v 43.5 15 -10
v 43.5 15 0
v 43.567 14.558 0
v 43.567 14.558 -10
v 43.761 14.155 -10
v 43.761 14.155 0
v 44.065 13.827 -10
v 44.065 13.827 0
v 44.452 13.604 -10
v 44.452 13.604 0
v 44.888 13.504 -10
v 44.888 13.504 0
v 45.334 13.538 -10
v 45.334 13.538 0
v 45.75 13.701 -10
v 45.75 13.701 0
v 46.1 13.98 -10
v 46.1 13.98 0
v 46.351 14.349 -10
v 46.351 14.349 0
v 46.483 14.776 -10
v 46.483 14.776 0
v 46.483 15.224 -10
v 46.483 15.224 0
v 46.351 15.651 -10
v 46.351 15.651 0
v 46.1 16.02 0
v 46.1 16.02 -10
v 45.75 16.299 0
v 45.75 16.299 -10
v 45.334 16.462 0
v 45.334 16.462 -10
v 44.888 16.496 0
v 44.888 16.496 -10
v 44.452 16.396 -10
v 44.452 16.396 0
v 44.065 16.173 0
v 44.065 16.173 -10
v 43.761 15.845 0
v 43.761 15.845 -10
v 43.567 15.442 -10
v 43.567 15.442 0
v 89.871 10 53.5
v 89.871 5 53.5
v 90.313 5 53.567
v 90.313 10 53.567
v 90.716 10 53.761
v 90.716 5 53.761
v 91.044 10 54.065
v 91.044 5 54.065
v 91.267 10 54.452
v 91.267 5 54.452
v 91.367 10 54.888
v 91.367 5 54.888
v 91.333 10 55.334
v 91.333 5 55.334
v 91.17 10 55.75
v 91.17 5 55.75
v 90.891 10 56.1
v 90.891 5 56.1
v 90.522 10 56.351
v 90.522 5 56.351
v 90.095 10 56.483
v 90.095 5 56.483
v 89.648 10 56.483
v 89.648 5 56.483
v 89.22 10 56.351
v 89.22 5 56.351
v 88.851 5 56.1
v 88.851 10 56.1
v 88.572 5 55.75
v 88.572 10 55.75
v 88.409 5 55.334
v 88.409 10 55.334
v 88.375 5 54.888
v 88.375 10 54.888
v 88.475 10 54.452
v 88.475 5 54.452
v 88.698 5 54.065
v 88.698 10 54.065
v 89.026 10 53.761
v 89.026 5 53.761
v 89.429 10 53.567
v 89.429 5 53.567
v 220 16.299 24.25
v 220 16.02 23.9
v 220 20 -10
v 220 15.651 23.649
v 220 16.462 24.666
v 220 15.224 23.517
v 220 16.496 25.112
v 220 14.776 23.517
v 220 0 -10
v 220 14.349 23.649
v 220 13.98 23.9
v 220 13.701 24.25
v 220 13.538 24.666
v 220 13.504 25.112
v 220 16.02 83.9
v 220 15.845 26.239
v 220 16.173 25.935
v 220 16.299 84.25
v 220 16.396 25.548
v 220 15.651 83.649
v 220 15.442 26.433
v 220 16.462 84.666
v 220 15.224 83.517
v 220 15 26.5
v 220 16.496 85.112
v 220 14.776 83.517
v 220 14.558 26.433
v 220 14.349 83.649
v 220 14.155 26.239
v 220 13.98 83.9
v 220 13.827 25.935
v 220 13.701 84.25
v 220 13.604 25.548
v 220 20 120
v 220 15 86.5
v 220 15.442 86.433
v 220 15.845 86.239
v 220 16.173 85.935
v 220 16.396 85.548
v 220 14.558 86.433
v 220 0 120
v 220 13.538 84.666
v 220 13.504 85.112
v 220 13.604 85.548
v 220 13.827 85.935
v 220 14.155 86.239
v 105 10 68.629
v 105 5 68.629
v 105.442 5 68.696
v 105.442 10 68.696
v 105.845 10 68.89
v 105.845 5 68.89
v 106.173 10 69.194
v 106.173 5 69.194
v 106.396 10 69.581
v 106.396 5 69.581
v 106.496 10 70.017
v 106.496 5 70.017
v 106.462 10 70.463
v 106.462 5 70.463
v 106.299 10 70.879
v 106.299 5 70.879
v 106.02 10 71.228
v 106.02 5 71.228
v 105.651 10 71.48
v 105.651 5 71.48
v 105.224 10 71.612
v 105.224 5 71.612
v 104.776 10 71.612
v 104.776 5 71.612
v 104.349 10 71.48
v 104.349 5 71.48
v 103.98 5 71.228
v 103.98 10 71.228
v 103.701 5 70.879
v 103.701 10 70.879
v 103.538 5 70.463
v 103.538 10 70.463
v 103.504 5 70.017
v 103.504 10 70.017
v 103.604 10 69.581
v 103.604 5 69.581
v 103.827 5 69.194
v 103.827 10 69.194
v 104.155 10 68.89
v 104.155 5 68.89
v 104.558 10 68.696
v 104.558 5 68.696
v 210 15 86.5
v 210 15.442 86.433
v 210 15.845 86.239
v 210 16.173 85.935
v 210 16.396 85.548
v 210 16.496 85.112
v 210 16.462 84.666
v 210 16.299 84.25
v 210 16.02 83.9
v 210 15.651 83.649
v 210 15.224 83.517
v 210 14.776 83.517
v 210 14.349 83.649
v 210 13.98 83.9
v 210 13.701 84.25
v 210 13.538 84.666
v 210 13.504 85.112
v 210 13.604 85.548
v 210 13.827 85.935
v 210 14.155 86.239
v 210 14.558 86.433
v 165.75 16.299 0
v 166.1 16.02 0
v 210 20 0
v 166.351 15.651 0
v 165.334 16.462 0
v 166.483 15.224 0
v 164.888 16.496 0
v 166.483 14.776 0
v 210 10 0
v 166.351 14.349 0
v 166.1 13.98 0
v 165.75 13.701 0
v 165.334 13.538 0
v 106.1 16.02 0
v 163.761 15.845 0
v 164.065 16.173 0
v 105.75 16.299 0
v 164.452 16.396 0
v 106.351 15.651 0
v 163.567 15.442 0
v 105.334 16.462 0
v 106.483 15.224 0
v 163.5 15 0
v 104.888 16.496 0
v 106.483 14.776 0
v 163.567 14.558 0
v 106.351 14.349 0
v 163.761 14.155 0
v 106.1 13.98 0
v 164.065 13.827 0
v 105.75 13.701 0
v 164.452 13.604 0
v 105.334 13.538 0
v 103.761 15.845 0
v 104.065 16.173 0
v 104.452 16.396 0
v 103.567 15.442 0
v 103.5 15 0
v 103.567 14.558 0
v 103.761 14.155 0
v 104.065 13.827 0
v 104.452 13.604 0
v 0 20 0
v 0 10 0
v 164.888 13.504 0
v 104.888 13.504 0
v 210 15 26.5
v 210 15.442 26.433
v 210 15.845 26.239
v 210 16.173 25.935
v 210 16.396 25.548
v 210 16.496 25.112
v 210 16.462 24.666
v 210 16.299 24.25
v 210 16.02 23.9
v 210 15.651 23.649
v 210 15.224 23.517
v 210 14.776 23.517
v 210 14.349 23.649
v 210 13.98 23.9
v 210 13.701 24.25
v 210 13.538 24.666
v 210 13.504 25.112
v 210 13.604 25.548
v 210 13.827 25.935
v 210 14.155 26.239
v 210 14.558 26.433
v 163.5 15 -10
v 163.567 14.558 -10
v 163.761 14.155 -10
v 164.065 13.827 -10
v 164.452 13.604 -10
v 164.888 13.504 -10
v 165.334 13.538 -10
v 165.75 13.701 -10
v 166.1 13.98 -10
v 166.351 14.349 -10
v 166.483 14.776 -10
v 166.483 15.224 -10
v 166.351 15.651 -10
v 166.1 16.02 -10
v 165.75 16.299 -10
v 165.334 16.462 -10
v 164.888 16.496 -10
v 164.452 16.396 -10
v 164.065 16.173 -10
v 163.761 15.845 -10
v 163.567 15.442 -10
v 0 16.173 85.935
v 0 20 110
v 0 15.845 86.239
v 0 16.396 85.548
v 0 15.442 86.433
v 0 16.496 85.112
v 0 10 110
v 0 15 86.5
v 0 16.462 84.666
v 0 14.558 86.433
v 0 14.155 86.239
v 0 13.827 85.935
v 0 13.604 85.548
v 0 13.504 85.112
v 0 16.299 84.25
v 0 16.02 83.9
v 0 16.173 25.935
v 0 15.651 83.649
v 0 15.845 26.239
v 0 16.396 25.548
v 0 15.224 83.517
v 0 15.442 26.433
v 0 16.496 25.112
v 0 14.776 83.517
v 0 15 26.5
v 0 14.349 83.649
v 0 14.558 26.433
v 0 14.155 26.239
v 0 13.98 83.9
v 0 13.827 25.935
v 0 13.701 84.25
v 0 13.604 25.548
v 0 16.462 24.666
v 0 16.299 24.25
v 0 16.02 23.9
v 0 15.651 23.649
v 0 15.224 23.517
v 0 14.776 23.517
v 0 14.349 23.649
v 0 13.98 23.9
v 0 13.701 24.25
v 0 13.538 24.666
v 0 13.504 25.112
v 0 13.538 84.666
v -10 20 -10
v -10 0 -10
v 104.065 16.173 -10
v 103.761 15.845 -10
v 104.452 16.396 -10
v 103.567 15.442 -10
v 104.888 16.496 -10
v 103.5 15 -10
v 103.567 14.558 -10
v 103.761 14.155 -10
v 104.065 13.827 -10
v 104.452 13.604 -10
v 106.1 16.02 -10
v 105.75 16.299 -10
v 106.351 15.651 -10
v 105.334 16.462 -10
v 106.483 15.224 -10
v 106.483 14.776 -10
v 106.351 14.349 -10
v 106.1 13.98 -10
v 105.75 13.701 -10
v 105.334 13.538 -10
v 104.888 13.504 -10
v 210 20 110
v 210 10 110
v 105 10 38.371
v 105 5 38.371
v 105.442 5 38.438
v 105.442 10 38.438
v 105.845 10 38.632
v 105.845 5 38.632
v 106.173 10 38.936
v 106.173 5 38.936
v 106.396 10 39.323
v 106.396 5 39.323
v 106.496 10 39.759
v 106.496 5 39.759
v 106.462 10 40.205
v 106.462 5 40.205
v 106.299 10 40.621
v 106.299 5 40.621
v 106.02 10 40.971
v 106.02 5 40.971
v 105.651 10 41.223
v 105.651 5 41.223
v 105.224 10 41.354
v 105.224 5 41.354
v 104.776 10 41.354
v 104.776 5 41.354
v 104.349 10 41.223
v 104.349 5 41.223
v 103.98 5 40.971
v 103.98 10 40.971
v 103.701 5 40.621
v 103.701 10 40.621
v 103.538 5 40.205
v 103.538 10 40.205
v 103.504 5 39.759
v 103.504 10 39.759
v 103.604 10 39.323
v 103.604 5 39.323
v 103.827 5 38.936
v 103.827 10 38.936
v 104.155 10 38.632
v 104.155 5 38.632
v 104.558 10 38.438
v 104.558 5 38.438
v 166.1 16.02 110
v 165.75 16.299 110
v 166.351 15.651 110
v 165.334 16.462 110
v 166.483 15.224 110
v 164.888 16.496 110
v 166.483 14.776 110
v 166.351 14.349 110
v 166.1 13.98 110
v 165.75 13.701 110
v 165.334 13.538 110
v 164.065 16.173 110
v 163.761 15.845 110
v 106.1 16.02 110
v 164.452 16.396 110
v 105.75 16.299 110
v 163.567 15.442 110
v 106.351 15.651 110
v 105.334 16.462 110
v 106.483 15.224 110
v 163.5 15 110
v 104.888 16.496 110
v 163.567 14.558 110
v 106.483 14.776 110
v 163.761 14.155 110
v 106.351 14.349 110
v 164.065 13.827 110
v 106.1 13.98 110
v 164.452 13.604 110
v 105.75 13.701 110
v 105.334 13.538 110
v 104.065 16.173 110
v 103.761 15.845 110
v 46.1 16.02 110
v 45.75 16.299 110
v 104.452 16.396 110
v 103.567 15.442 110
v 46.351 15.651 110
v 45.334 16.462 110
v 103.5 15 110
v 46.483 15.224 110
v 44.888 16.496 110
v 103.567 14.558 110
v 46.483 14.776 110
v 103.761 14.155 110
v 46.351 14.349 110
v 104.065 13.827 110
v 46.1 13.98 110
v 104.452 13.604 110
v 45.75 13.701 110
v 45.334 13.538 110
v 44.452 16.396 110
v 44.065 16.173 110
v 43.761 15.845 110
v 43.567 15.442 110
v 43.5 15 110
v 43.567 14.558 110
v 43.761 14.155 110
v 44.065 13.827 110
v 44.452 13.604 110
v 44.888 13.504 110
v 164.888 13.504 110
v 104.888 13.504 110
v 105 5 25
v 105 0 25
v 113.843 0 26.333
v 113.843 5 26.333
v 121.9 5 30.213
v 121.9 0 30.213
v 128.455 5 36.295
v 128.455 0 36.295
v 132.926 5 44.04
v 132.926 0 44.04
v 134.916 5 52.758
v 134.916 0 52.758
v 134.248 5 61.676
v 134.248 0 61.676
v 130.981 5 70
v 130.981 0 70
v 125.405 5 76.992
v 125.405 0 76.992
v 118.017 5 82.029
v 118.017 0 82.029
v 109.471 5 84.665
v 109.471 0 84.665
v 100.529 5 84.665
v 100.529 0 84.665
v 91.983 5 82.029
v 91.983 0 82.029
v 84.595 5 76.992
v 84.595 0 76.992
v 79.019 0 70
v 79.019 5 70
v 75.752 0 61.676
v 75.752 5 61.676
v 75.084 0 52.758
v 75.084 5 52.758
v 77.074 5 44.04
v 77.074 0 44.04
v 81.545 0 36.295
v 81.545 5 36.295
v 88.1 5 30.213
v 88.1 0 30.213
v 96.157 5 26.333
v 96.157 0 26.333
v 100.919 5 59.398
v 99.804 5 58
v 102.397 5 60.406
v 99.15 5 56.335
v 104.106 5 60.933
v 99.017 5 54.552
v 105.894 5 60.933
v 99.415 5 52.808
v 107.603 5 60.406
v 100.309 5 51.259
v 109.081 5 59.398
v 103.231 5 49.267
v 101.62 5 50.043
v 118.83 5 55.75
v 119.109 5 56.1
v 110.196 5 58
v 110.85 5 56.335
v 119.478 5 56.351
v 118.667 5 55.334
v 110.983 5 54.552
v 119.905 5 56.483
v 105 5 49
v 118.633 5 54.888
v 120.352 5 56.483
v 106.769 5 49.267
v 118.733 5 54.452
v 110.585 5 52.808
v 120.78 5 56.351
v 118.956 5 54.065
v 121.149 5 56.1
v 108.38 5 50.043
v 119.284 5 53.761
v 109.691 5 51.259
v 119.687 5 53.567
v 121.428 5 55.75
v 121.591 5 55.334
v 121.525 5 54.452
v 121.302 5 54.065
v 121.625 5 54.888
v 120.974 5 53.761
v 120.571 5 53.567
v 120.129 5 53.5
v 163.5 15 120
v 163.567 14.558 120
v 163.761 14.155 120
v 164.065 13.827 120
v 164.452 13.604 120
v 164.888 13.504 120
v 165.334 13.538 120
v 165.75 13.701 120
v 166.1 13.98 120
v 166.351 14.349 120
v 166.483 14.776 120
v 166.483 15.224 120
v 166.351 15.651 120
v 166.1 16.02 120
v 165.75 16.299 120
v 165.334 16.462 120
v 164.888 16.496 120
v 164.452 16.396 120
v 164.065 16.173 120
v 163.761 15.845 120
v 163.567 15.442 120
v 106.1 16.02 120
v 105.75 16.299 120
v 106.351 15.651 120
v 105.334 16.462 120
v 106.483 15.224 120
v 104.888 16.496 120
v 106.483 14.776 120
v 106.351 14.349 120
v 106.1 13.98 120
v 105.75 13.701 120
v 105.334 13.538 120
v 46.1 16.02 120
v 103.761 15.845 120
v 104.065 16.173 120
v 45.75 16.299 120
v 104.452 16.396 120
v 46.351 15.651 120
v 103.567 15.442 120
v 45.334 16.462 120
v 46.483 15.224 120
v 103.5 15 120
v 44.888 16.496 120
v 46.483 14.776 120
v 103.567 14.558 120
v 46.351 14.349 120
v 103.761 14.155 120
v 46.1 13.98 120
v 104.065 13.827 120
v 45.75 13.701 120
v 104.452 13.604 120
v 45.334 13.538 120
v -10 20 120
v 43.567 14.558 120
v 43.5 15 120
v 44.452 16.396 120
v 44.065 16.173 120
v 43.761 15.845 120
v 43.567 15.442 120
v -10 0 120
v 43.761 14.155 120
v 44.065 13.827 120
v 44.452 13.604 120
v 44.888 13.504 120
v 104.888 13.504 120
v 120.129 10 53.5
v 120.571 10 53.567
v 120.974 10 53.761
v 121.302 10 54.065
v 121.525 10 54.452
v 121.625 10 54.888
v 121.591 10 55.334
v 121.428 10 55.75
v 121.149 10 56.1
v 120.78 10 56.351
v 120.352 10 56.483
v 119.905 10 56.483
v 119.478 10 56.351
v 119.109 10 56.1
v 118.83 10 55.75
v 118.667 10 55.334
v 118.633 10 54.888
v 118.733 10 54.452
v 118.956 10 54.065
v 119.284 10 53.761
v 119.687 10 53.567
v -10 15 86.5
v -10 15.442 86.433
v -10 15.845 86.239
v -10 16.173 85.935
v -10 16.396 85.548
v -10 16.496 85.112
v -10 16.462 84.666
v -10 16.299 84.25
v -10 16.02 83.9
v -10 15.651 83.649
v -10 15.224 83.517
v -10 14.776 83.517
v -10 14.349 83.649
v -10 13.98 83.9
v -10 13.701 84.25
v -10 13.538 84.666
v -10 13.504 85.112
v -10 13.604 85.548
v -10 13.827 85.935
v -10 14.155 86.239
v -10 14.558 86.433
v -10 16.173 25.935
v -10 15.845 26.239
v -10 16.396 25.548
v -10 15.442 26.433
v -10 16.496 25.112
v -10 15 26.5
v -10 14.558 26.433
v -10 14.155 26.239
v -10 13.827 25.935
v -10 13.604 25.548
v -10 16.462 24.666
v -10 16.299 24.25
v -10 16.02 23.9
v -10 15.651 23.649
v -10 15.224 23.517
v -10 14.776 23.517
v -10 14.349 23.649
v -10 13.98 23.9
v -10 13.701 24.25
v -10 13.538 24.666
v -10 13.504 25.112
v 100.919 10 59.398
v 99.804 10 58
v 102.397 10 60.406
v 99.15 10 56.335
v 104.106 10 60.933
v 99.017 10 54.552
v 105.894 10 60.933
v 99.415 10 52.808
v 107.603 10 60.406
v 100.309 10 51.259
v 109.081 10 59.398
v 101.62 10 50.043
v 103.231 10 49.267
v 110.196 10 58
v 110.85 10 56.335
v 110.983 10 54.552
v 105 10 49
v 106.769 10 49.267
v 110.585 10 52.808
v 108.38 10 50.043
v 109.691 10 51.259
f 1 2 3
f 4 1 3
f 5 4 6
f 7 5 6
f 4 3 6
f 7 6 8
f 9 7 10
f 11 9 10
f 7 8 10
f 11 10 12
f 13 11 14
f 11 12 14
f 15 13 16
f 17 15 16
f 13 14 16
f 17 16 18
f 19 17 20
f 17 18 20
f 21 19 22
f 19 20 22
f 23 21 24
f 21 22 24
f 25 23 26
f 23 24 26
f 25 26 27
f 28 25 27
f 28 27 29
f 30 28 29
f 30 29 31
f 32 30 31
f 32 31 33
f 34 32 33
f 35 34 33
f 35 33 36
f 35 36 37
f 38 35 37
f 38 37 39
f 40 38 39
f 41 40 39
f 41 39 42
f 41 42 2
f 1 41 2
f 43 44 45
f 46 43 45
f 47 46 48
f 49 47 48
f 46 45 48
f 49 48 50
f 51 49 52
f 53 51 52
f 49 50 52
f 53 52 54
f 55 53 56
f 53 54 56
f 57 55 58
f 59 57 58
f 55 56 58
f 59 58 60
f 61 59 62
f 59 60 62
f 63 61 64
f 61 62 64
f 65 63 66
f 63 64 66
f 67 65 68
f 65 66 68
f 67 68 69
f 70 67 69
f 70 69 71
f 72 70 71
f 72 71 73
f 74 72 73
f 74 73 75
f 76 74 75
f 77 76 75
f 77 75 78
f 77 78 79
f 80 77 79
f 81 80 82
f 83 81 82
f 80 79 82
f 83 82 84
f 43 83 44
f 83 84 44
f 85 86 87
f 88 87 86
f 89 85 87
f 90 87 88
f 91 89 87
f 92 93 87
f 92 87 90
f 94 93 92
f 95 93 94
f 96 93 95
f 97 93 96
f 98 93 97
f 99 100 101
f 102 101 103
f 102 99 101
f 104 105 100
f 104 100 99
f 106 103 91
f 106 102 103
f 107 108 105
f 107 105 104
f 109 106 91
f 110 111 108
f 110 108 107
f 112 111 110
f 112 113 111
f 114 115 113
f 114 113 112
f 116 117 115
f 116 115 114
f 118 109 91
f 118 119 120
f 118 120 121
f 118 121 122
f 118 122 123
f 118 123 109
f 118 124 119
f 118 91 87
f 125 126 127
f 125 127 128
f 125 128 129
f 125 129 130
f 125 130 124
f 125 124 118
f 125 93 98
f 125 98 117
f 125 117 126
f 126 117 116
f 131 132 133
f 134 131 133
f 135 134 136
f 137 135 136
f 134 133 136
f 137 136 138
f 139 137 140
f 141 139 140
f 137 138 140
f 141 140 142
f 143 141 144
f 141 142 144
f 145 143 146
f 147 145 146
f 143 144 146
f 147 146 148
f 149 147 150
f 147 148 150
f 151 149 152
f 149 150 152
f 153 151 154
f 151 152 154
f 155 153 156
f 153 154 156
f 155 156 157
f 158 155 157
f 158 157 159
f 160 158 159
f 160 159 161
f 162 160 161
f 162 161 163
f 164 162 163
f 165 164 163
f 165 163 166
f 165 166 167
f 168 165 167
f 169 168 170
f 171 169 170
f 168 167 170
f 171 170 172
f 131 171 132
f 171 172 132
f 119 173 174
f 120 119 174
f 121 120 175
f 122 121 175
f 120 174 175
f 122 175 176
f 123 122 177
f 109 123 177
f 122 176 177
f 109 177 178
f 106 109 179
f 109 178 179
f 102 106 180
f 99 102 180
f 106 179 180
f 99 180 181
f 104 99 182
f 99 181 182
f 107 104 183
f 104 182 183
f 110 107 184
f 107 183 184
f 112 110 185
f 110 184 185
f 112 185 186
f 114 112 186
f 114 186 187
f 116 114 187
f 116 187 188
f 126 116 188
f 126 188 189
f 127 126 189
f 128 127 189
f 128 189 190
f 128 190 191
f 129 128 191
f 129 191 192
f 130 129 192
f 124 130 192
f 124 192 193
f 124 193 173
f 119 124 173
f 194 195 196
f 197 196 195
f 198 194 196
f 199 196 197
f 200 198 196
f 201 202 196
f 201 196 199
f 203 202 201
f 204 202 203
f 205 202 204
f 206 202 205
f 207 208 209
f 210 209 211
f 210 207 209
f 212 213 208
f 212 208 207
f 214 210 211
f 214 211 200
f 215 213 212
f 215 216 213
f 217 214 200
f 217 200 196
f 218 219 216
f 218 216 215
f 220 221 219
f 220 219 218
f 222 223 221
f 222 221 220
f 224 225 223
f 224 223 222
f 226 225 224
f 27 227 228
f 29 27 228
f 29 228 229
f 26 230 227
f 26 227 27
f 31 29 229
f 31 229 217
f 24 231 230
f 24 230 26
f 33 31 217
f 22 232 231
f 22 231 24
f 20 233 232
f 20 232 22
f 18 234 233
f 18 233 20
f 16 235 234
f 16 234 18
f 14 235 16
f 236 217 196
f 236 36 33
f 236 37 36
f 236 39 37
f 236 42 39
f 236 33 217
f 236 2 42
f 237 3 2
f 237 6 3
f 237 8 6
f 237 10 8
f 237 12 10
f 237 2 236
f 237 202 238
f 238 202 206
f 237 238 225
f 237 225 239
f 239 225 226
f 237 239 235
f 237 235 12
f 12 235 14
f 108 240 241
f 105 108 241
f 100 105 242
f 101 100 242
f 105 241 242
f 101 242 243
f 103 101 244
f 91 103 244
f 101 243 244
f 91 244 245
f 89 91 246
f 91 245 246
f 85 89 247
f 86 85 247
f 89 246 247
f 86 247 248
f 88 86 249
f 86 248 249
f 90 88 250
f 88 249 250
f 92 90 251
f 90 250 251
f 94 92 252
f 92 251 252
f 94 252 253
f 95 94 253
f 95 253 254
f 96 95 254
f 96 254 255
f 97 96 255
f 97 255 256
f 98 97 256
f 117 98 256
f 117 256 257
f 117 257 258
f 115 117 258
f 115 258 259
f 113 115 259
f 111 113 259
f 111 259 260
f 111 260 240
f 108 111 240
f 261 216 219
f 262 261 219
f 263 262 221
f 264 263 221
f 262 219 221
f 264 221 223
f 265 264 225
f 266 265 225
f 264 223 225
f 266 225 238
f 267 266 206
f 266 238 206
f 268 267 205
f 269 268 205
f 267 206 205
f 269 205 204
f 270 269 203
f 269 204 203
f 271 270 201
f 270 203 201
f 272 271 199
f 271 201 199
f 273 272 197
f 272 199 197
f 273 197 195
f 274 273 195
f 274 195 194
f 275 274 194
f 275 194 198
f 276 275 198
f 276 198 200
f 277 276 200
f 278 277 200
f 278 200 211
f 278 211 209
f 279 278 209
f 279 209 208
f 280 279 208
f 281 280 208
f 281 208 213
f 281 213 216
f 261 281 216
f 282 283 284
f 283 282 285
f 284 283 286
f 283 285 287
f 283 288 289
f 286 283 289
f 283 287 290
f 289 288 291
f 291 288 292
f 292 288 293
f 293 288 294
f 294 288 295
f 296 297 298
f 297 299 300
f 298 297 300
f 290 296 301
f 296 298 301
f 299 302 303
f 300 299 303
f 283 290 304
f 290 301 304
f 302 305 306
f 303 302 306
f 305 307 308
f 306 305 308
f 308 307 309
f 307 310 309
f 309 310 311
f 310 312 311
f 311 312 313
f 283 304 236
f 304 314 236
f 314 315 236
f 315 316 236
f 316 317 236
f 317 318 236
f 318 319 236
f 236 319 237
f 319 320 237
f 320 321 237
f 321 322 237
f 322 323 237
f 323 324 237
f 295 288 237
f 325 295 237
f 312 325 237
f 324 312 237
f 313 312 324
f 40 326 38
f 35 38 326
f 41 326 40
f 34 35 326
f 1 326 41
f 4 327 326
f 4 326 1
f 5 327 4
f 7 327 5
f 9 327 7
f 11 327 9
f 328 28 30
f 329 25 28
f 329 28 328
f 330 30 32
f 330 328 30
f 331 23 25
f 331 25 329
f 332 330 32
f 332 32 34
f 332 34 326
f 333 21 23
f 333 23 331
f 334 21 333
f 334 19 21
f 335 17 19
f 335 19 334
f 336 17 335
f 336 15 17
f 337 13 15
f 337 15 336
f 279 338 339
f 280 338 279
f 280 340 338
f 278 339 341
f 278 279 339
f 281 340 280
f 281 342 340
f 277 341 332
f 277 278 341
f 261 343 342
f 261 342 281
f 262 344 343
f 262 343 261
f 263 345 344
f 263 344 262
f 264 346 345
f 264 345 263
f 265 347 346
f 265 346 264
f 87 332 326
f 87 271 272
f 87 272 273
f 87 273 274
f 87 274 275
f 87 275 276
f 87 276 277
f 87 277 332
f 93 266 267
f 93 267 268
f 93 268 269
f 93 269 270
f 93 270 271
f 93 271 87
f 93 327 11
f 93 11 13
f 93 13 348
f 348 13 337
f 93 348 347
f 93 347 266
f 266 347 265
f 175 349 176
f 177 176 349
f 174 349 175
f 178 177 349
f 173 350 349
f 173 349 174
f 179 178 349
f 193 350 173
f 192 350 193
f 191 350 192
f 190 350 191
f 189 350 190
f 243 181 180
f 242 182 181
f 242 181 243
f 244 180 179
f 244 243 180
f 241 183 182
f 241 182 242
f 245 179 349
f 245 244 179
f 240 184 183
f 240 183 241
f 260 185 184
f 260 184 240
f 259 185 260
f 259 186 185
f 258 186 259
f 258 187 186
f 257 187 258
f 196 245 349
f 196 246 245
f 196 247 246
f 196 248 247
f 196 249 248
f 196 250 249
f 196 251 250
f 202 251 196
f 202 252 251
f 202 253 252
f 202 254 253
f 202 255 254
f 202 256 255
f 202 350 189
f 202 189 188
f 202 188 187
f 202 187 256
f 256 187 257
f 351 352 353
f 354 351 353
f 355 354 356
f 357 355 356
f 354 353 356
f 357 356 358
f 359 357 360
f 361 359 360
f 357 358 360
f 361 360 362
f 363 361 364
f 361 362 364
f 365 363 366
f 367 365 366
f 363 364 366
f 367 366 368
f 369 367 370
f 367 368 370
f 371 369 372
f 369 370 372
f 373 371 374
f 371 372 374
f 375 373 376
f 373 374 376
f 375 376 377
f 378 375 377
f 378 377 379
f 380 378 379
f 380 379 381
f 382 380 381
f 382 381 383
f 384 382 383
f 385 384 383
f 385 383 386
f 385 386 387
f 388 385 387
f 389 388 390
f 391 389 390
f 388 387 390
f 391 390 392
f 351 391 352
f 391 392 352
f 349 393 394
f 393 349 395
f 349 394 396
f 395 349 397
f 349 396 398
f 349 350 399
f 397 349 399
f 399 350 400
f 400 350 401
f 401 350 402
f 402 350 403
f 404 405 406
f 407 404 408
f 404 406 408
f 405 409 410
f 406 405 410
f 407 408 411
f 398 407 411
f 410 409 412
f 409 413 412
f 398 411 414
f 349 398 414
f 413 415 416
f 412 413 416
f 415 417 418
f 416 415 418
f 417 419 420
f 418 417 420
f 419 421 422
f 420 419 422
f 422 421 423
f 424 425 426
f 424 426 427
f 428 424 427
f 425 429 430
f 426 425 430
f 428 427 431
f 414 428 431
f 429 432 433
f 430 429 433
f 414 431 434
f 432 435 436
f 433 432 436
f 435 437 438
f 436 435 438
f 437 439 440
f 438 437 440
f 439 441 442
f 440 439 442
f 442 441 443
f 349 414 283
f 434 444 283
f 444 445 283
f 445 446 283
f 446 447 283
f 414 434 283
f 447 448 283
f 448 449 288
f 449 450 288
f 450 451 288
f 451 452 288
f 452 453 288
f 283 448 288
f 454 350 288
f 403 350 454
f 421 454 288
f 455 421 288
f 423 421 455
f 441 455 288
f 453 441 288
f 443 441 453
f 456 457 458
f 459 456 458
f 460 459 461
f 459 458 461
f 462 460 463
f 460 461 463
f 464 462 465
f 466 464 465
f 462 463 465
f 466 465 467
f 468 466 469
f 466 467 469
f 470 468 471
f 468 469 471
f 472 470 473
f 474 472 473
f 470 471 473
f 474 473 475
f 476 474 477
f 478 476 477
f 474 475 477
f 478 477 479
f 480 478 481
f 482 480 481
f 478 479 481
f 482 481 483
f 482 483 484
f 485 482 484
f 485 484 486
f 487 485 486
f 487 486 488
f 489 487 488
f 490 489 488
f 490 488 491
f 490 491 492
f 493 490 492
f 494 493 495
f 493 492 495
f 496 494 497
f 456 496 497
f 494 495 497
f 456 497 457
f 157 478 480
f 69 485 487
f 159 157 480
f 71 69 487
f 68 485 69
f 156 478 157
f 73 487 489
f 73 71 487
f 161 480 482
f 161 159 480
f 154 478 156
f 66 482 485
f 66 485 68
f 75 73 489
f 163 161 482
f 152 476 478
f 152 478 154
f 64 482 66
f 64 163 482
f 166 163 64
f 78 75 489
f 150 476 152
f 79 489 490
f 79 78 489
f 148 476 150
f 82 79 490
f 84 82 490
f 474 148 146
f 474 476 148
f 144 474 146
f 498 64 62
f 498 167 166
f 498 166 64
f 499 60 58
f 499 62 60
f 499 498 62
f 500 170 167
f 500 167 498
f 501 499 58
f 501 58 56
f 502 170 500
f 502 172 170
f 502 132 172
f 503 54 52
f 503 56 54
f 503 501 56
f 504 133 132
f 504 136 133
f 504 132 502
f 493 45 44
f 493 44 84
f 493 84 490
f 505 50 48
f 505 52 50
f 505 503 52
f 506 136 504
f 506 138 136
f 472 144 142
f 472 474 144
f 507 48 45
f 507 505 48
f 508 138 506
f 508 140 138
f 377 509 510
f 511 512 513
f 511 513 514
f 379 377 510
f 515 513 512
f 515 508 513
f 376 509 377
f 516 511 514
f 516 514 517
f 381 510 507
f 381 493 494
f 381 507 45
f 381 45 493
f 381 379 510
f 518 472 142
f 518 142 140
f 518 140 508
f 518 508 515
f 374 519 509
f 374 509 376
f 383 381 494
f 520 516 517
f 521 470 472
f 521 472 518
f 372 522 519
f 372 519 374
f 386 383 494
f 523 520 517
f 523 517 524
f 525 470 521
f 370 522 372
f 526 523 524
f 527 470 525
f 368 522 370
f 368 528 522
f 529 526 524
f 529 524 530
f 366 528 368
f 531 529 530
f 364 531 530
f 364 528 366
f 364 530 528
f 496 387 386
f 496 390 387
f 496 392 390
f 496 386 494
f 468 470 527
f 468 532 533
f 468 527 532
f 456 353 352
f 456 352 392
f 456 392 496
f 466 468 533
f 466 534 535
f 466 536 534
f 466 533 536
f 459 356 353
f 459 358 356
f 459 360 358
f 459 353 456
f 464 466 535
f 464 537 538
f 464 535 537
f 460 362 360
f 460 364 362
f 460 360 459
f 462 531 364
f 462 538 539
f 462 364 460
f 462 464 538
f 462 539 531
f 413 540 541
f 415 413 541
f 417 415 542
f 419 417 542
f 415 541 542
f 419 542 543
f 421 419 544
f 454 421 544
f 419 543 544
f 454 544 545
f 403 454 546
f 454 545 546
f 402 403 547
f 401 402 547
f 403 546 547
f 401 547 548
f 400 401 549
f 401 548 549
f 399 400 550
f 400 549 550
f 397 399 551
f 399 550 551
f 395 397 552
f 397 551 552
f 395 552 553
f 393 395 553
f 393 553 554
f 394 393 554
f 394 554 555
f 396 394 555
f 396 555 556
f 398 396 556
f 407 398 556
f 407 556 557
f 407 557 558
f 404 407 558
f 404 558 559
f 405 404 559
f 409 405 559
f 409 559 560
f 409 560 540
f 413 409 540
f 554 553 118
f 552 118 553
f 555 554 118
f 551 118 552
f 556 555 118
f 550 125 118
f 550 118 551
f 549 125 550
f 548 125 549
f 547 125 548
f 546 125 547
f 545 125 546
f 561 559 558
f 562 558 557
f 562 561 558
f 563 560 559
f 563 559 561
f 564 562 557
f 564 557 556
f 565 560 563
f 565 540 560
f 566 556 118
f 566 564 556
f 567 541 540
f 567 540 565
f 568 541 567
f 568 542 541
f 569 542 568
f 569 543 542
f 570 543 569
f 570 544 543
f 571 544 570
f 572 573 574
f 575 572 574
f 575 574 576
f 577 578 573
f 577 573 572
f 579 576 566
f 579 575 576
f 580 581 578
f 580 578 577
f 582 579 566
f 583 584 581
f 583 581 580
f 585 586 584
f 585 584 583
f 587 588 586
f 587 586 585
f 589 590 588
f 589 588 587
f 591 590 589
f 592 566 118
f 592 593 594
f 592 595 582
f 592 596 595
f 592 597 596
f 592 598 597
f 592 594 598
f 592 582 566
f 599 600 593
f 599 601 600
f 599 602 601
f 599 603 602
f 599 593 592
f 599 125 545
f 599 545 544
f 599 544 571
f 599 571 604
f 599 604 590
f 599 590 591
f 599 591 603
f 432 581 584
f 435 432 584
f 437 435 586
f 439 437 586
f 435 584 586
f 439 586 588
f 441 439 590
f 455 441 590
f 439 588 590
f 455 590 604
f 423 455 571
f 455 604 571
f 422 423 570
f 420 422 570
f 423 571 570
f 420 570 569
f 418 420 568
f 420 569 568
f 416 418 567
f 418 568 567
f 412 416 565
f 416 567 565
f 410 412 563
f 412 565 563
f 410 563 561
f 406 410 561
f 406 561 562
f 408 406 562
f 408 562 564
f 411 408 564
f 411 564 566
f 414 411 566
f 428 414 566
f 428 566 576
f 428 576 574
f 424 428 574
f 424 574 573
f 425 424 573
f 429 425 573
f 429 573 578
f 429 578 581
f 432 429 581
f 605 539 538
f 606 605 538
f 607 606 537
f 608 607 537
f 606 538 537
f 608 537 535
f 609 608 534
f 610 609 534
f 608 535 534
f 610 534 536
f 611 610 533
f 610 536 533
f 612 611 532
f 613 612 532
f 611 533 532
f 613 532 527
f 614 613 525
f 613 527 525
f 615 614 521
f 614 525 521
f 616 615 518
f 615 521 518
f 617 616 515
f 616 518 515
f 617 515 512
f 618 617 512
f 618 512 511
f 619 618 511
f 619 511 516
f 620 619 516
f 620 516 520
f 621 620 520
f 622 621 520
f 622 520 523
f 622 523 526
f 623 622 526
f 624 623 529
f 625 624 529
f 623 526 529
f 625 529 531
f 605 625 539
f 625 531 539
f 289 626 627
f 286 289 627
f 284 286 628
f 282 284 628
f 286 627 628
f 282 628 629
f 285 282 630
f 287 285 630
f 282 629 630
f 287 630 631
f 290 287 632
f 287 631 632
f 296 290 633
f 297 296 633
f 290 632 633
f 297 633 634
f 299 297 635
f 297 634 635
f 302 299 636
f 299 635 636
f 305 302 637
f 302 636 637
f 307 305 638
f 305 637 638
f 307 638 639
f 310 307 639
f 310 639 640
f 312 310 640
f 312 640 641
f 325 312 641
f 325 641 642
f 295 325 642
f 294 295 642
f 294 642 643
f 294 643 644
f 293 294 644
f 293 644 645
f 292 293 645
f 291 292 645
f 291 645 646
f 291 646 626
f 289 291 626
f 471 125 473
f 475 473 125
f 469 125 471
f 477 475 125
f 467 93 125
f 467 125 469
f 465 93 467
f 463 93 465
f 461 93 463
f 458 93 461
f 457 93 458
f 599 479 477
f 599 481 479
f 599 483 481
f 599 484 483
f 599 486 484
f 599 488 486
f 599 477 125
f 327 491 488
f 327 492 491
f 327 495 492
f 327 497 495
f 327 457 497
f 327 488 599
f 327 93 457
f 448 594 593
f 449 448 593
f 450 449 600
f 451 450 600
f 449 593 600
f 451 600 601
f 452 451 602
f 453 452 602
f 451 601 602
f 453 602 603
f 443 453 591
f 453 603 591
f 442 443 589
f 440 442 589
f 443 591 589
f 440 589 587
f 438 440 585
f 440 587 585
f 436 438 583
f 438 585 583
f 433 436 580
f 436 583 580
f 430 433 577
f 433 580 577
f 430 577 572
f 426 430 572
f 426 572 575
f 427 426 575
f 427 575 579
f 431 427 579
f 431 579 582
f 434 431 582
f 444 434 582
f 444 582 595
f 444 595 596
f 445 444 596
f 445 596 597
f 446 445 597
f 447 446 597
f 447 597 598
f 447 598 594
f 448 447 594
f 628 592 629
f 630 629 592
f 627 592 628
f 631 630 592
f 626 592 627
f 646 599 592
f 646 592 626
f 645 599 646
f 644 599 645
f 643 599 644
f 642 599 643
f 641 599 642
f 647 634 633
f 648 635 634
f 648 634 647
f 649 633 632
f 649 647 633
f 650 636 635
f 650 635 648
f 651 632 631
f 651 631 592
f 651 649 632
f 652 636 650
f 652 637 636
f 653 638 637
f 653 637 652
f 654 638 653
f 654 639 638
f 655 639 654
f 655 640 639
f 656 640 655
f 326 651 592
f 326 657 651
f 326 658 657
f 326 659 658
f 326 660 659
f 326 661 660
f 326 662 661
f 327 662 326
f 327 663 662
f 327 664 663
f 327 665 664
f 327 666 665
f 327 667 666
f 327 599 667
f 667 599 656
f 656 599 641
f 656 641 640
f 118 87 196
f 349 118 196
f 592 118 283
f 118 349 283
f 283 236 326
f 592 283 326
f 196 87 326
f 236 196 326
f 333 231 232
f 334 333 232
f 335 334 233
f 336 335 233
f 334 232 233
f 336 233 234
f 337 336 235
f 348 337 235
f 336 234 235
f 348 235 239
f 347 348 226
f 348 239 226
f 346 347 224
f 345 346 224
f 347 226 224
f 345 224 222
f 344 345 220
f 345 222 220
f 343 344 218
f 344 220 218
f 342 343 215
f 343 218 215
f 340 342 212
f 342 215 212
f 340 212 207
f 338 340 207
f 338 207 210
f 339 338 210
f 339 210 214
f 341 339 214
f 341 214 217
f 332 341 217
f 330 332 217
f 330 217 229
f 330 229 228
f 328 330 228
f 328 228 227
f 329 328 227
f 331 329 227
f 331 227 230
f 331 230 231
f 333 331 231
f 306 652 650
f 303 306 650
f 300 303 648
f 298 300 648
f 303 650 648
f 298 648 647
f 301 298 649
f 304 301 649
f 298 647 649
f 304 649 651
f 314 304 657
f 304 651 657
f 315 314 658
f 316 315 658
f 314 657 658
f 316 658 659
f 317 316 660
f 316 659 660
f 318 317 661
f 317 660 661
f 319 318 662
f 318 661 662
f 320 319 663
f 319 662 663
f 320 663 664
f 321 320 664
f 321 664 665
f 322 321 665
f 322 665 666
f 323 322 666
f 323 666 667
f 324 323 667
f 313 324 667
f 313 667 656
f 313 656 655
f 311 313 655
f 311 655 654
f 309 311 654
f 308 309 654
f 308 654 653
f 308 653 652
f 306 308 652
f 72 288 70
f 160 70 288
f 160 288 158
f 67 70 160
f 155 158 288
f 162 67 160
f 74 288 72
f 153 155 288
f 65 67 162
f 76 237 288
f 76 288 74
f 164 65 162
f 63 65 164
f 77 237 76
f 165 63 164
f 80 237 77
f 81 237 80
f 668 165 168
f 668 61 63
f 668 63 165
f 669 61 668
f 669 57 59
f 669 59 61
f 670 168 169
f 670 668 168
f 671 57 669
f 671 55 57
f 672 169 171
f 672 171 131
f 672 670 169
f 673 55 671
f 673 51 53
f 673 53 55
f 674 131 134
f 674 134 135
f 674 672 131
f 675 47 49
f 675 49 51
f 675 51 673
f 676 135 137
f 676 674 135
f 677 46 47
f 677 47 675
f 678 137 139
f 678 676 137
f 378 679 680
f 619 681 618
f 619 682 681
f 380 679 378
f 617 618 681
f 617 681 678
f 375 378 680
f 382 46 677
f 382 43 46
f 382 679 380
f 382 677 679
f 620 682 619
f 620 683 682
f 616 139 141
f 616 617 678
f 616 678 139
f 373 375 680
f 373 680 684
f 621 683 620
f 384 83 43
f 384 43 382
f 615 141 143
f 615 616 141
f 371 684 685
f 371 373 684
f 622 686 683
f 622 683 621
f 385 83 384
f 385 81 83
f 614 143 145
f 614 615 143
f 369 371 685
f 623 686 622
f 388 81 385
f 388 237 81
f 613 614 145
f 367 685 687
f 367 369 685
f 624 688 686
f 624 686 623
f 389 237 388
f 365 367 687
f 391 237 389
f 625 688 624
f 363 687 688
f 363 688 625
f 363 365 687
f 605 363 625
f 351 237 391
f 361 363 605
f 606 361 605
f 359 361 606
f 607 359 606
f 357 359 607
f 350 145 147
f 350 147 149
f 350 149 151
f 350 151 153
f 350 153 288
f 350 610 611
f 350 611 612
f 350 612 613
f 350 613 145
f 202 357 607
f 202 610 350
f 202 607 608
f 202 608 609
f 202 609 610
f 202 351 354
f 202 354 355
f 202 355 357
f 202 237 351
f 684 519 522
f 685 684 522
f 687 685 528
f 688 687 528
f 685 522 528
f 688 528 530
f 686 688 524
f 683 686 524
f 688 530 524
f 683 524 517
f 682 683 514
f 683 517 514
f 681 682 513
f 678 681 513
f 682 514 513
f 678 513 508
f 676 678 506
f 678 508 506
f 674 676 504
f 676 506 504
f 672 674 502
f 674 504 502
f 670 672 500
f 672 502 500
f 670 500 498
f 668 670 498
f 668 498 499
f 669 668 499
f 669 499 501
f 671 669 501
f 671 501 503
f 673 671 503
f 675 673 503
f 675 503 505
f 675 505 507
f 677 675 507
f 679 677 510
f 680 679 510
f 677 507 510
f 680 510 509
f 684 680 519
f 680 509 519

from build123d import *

# Parameters (mm, degrees)
SKETCH1_W           = 210
SKETCH1_H           = 110
BOSS_EXTRUDE1_DEPTH = 10
CUT_EXTRUDE1_DEPTH  = 5
SKETCH3_R           = 1.5
CUT_EXTRUDE2_DEPTH  = 5
SKETCH4_R           = 6
CUT_EXTRUDE3_DEPTH  = 5
SKETCH5_R           = 30
CUT_EXTRUDE4_DEPTH  = 5
SKETCH10_W          = 210
SKETCH10_H          = 110
BOSS_EXTRUDE2_DEPTH = 20
SKETCH11_R          = 1.5
CUT_EXTRUDE6_DEPTH  = 300
SKETCH12_R          = 1.5
CUT_EXTRUDE7_DEPTH  = 300


with BuildPart() as part:
    # Sketch1 → Boss-Extrude1 (new body)
    with BuildSketch(Plane(origin=(0, 0, 0), x_dir=(1, 0, 0), z_dir=(0, 1, 0))):
        with Locations((105, -55)):
            Rectangle(SKETCH1_W, SKETCH1_H)
    extrude(amount=BOSS_EXTRUDE1_DEPTH)

    # Sketch2 → Cut-Extrude1 (cut)
    with BuildSketch(Plane(origin=(0, 0, 0), x_dir=(-1, 0, 0), z_dir=(0, -1, 0))):
        with BuildLine():
            ThreePointArc((-130, -55), (-105, -80), (-80, -55))
            Line((-80, -55), (-130, -55))
        make_face()
        with BuildLine():
            Line((-130, -55), (-80, -55))
            ThreePointArc((-80, -55), (-105, -30), (-130, -55))
        make_face()
    extrude(amount=-CUT_EXTRUDE1_DEPTH, mode=Mode.SUBTRACT)

    # Sketch3 → Cut-Extrude2 (cut)
    with BuildSketch(Plane(origin=(0, 5, 0), x_dir=(-1, 0, 0), z_dir=(0, -1, 0))):
        with Locations(Location((-105, -70.12891571, 0), (0, 0, 90))):
            Circle(SKETCH3_R)
        with Locations(Location((-120.12891571, -55, 0), (0, 0, 90))):
            Circle(SKETCH3_R)
        with Locations(Location((-105, -39.87108429, 0), (0, 0, 90))):
            Circle(SKETCH3_R)
        with Locations(Location((-89.87108429, -55, 0), (0, 0, 90))):
            Circle(SKETCH3_R)
    extrude(amount=-CUT_EXTRUDE2_DEPTH, mode=Mode.SUBTRACT)

    # Sketch4 → Cut-Extrude3 (cut)
    with BuildSketch(Plane(origin=(0, 5, 0), x_dir=(-1, 0, 0), z_dir=(0, -1, 0))):
        with Locations(Location((-105, -55, 0), (0, 0, 90))):
            Circle(SKETCH4_R)
    extrude(amount=-CUT_EXTRUDE3_DEPTH, mode=Mode.SUBTRACT)

    # Sketch5 → Cut-Extrude4 (cut)
    with BuildSketch(Plane(origin=(0, 0, 0), x_dir=(-1, 0, 0), z_dir=(0, -1, 0))):
        with Locations(Location((-105, -55, 0), (0, 0, 90))):
            Circle(SKETCH5_R)
    extrude(amount=-CUT_EXTRUDE4_DEPTH, mode=Mode.SUBTRACT)

    # Sketch10 → Boss-Extrude2 (add)
    with BuildSketch(Plane(origin=(0, 0, 0), x_dir=(-1, 0, 0), z_dir=(0, -1, 0))):
        Polygon((10, -110), (10, 10), (-220, 10), (-220, -120), (10, -120), align=None)
        with Locations((-105, -55)):
            Rectangle(SKETCH10_W, SKETCH10_H, mode=Mode.SUBTRACT)
    extrude(amount=-BOSS_EXTRUDE2_DEPTH)

    # Sketch11 → Cut-Extrude6 (cut)
    with BuildSketch(Plane.ZY.offset(10)):
        with Locations((25, 15)):
            Circle(SKETCH11_R)
        with Locations((85, 15)):
            Circle(SKETCH11_R)
    extrude(amount=-CUT_EXTRUDE6_DEPTH, mode=Mode.SUBTRACT)

    # Sketch12 → Cut-Extrude7 (cut)
    with BuildSketch(Plane.XY.offset(120)):
        with Locations(Location((45, 15, 0), (0, 0, 180))):
            Circle(SKETCH12_R)
        with Locations(Location((165, 15, 0), (0, 0, 180))):
            Circle(SKETCH12_R)
        with Locations(Location((105, 15, 0), (0, 0, 180))):
            Circle(SKETCH12_R)
    extrude(amount=-CUT_EXTRUDE7_DEPTH, mode=Mode.SUBTRACT)


solid = part.part
